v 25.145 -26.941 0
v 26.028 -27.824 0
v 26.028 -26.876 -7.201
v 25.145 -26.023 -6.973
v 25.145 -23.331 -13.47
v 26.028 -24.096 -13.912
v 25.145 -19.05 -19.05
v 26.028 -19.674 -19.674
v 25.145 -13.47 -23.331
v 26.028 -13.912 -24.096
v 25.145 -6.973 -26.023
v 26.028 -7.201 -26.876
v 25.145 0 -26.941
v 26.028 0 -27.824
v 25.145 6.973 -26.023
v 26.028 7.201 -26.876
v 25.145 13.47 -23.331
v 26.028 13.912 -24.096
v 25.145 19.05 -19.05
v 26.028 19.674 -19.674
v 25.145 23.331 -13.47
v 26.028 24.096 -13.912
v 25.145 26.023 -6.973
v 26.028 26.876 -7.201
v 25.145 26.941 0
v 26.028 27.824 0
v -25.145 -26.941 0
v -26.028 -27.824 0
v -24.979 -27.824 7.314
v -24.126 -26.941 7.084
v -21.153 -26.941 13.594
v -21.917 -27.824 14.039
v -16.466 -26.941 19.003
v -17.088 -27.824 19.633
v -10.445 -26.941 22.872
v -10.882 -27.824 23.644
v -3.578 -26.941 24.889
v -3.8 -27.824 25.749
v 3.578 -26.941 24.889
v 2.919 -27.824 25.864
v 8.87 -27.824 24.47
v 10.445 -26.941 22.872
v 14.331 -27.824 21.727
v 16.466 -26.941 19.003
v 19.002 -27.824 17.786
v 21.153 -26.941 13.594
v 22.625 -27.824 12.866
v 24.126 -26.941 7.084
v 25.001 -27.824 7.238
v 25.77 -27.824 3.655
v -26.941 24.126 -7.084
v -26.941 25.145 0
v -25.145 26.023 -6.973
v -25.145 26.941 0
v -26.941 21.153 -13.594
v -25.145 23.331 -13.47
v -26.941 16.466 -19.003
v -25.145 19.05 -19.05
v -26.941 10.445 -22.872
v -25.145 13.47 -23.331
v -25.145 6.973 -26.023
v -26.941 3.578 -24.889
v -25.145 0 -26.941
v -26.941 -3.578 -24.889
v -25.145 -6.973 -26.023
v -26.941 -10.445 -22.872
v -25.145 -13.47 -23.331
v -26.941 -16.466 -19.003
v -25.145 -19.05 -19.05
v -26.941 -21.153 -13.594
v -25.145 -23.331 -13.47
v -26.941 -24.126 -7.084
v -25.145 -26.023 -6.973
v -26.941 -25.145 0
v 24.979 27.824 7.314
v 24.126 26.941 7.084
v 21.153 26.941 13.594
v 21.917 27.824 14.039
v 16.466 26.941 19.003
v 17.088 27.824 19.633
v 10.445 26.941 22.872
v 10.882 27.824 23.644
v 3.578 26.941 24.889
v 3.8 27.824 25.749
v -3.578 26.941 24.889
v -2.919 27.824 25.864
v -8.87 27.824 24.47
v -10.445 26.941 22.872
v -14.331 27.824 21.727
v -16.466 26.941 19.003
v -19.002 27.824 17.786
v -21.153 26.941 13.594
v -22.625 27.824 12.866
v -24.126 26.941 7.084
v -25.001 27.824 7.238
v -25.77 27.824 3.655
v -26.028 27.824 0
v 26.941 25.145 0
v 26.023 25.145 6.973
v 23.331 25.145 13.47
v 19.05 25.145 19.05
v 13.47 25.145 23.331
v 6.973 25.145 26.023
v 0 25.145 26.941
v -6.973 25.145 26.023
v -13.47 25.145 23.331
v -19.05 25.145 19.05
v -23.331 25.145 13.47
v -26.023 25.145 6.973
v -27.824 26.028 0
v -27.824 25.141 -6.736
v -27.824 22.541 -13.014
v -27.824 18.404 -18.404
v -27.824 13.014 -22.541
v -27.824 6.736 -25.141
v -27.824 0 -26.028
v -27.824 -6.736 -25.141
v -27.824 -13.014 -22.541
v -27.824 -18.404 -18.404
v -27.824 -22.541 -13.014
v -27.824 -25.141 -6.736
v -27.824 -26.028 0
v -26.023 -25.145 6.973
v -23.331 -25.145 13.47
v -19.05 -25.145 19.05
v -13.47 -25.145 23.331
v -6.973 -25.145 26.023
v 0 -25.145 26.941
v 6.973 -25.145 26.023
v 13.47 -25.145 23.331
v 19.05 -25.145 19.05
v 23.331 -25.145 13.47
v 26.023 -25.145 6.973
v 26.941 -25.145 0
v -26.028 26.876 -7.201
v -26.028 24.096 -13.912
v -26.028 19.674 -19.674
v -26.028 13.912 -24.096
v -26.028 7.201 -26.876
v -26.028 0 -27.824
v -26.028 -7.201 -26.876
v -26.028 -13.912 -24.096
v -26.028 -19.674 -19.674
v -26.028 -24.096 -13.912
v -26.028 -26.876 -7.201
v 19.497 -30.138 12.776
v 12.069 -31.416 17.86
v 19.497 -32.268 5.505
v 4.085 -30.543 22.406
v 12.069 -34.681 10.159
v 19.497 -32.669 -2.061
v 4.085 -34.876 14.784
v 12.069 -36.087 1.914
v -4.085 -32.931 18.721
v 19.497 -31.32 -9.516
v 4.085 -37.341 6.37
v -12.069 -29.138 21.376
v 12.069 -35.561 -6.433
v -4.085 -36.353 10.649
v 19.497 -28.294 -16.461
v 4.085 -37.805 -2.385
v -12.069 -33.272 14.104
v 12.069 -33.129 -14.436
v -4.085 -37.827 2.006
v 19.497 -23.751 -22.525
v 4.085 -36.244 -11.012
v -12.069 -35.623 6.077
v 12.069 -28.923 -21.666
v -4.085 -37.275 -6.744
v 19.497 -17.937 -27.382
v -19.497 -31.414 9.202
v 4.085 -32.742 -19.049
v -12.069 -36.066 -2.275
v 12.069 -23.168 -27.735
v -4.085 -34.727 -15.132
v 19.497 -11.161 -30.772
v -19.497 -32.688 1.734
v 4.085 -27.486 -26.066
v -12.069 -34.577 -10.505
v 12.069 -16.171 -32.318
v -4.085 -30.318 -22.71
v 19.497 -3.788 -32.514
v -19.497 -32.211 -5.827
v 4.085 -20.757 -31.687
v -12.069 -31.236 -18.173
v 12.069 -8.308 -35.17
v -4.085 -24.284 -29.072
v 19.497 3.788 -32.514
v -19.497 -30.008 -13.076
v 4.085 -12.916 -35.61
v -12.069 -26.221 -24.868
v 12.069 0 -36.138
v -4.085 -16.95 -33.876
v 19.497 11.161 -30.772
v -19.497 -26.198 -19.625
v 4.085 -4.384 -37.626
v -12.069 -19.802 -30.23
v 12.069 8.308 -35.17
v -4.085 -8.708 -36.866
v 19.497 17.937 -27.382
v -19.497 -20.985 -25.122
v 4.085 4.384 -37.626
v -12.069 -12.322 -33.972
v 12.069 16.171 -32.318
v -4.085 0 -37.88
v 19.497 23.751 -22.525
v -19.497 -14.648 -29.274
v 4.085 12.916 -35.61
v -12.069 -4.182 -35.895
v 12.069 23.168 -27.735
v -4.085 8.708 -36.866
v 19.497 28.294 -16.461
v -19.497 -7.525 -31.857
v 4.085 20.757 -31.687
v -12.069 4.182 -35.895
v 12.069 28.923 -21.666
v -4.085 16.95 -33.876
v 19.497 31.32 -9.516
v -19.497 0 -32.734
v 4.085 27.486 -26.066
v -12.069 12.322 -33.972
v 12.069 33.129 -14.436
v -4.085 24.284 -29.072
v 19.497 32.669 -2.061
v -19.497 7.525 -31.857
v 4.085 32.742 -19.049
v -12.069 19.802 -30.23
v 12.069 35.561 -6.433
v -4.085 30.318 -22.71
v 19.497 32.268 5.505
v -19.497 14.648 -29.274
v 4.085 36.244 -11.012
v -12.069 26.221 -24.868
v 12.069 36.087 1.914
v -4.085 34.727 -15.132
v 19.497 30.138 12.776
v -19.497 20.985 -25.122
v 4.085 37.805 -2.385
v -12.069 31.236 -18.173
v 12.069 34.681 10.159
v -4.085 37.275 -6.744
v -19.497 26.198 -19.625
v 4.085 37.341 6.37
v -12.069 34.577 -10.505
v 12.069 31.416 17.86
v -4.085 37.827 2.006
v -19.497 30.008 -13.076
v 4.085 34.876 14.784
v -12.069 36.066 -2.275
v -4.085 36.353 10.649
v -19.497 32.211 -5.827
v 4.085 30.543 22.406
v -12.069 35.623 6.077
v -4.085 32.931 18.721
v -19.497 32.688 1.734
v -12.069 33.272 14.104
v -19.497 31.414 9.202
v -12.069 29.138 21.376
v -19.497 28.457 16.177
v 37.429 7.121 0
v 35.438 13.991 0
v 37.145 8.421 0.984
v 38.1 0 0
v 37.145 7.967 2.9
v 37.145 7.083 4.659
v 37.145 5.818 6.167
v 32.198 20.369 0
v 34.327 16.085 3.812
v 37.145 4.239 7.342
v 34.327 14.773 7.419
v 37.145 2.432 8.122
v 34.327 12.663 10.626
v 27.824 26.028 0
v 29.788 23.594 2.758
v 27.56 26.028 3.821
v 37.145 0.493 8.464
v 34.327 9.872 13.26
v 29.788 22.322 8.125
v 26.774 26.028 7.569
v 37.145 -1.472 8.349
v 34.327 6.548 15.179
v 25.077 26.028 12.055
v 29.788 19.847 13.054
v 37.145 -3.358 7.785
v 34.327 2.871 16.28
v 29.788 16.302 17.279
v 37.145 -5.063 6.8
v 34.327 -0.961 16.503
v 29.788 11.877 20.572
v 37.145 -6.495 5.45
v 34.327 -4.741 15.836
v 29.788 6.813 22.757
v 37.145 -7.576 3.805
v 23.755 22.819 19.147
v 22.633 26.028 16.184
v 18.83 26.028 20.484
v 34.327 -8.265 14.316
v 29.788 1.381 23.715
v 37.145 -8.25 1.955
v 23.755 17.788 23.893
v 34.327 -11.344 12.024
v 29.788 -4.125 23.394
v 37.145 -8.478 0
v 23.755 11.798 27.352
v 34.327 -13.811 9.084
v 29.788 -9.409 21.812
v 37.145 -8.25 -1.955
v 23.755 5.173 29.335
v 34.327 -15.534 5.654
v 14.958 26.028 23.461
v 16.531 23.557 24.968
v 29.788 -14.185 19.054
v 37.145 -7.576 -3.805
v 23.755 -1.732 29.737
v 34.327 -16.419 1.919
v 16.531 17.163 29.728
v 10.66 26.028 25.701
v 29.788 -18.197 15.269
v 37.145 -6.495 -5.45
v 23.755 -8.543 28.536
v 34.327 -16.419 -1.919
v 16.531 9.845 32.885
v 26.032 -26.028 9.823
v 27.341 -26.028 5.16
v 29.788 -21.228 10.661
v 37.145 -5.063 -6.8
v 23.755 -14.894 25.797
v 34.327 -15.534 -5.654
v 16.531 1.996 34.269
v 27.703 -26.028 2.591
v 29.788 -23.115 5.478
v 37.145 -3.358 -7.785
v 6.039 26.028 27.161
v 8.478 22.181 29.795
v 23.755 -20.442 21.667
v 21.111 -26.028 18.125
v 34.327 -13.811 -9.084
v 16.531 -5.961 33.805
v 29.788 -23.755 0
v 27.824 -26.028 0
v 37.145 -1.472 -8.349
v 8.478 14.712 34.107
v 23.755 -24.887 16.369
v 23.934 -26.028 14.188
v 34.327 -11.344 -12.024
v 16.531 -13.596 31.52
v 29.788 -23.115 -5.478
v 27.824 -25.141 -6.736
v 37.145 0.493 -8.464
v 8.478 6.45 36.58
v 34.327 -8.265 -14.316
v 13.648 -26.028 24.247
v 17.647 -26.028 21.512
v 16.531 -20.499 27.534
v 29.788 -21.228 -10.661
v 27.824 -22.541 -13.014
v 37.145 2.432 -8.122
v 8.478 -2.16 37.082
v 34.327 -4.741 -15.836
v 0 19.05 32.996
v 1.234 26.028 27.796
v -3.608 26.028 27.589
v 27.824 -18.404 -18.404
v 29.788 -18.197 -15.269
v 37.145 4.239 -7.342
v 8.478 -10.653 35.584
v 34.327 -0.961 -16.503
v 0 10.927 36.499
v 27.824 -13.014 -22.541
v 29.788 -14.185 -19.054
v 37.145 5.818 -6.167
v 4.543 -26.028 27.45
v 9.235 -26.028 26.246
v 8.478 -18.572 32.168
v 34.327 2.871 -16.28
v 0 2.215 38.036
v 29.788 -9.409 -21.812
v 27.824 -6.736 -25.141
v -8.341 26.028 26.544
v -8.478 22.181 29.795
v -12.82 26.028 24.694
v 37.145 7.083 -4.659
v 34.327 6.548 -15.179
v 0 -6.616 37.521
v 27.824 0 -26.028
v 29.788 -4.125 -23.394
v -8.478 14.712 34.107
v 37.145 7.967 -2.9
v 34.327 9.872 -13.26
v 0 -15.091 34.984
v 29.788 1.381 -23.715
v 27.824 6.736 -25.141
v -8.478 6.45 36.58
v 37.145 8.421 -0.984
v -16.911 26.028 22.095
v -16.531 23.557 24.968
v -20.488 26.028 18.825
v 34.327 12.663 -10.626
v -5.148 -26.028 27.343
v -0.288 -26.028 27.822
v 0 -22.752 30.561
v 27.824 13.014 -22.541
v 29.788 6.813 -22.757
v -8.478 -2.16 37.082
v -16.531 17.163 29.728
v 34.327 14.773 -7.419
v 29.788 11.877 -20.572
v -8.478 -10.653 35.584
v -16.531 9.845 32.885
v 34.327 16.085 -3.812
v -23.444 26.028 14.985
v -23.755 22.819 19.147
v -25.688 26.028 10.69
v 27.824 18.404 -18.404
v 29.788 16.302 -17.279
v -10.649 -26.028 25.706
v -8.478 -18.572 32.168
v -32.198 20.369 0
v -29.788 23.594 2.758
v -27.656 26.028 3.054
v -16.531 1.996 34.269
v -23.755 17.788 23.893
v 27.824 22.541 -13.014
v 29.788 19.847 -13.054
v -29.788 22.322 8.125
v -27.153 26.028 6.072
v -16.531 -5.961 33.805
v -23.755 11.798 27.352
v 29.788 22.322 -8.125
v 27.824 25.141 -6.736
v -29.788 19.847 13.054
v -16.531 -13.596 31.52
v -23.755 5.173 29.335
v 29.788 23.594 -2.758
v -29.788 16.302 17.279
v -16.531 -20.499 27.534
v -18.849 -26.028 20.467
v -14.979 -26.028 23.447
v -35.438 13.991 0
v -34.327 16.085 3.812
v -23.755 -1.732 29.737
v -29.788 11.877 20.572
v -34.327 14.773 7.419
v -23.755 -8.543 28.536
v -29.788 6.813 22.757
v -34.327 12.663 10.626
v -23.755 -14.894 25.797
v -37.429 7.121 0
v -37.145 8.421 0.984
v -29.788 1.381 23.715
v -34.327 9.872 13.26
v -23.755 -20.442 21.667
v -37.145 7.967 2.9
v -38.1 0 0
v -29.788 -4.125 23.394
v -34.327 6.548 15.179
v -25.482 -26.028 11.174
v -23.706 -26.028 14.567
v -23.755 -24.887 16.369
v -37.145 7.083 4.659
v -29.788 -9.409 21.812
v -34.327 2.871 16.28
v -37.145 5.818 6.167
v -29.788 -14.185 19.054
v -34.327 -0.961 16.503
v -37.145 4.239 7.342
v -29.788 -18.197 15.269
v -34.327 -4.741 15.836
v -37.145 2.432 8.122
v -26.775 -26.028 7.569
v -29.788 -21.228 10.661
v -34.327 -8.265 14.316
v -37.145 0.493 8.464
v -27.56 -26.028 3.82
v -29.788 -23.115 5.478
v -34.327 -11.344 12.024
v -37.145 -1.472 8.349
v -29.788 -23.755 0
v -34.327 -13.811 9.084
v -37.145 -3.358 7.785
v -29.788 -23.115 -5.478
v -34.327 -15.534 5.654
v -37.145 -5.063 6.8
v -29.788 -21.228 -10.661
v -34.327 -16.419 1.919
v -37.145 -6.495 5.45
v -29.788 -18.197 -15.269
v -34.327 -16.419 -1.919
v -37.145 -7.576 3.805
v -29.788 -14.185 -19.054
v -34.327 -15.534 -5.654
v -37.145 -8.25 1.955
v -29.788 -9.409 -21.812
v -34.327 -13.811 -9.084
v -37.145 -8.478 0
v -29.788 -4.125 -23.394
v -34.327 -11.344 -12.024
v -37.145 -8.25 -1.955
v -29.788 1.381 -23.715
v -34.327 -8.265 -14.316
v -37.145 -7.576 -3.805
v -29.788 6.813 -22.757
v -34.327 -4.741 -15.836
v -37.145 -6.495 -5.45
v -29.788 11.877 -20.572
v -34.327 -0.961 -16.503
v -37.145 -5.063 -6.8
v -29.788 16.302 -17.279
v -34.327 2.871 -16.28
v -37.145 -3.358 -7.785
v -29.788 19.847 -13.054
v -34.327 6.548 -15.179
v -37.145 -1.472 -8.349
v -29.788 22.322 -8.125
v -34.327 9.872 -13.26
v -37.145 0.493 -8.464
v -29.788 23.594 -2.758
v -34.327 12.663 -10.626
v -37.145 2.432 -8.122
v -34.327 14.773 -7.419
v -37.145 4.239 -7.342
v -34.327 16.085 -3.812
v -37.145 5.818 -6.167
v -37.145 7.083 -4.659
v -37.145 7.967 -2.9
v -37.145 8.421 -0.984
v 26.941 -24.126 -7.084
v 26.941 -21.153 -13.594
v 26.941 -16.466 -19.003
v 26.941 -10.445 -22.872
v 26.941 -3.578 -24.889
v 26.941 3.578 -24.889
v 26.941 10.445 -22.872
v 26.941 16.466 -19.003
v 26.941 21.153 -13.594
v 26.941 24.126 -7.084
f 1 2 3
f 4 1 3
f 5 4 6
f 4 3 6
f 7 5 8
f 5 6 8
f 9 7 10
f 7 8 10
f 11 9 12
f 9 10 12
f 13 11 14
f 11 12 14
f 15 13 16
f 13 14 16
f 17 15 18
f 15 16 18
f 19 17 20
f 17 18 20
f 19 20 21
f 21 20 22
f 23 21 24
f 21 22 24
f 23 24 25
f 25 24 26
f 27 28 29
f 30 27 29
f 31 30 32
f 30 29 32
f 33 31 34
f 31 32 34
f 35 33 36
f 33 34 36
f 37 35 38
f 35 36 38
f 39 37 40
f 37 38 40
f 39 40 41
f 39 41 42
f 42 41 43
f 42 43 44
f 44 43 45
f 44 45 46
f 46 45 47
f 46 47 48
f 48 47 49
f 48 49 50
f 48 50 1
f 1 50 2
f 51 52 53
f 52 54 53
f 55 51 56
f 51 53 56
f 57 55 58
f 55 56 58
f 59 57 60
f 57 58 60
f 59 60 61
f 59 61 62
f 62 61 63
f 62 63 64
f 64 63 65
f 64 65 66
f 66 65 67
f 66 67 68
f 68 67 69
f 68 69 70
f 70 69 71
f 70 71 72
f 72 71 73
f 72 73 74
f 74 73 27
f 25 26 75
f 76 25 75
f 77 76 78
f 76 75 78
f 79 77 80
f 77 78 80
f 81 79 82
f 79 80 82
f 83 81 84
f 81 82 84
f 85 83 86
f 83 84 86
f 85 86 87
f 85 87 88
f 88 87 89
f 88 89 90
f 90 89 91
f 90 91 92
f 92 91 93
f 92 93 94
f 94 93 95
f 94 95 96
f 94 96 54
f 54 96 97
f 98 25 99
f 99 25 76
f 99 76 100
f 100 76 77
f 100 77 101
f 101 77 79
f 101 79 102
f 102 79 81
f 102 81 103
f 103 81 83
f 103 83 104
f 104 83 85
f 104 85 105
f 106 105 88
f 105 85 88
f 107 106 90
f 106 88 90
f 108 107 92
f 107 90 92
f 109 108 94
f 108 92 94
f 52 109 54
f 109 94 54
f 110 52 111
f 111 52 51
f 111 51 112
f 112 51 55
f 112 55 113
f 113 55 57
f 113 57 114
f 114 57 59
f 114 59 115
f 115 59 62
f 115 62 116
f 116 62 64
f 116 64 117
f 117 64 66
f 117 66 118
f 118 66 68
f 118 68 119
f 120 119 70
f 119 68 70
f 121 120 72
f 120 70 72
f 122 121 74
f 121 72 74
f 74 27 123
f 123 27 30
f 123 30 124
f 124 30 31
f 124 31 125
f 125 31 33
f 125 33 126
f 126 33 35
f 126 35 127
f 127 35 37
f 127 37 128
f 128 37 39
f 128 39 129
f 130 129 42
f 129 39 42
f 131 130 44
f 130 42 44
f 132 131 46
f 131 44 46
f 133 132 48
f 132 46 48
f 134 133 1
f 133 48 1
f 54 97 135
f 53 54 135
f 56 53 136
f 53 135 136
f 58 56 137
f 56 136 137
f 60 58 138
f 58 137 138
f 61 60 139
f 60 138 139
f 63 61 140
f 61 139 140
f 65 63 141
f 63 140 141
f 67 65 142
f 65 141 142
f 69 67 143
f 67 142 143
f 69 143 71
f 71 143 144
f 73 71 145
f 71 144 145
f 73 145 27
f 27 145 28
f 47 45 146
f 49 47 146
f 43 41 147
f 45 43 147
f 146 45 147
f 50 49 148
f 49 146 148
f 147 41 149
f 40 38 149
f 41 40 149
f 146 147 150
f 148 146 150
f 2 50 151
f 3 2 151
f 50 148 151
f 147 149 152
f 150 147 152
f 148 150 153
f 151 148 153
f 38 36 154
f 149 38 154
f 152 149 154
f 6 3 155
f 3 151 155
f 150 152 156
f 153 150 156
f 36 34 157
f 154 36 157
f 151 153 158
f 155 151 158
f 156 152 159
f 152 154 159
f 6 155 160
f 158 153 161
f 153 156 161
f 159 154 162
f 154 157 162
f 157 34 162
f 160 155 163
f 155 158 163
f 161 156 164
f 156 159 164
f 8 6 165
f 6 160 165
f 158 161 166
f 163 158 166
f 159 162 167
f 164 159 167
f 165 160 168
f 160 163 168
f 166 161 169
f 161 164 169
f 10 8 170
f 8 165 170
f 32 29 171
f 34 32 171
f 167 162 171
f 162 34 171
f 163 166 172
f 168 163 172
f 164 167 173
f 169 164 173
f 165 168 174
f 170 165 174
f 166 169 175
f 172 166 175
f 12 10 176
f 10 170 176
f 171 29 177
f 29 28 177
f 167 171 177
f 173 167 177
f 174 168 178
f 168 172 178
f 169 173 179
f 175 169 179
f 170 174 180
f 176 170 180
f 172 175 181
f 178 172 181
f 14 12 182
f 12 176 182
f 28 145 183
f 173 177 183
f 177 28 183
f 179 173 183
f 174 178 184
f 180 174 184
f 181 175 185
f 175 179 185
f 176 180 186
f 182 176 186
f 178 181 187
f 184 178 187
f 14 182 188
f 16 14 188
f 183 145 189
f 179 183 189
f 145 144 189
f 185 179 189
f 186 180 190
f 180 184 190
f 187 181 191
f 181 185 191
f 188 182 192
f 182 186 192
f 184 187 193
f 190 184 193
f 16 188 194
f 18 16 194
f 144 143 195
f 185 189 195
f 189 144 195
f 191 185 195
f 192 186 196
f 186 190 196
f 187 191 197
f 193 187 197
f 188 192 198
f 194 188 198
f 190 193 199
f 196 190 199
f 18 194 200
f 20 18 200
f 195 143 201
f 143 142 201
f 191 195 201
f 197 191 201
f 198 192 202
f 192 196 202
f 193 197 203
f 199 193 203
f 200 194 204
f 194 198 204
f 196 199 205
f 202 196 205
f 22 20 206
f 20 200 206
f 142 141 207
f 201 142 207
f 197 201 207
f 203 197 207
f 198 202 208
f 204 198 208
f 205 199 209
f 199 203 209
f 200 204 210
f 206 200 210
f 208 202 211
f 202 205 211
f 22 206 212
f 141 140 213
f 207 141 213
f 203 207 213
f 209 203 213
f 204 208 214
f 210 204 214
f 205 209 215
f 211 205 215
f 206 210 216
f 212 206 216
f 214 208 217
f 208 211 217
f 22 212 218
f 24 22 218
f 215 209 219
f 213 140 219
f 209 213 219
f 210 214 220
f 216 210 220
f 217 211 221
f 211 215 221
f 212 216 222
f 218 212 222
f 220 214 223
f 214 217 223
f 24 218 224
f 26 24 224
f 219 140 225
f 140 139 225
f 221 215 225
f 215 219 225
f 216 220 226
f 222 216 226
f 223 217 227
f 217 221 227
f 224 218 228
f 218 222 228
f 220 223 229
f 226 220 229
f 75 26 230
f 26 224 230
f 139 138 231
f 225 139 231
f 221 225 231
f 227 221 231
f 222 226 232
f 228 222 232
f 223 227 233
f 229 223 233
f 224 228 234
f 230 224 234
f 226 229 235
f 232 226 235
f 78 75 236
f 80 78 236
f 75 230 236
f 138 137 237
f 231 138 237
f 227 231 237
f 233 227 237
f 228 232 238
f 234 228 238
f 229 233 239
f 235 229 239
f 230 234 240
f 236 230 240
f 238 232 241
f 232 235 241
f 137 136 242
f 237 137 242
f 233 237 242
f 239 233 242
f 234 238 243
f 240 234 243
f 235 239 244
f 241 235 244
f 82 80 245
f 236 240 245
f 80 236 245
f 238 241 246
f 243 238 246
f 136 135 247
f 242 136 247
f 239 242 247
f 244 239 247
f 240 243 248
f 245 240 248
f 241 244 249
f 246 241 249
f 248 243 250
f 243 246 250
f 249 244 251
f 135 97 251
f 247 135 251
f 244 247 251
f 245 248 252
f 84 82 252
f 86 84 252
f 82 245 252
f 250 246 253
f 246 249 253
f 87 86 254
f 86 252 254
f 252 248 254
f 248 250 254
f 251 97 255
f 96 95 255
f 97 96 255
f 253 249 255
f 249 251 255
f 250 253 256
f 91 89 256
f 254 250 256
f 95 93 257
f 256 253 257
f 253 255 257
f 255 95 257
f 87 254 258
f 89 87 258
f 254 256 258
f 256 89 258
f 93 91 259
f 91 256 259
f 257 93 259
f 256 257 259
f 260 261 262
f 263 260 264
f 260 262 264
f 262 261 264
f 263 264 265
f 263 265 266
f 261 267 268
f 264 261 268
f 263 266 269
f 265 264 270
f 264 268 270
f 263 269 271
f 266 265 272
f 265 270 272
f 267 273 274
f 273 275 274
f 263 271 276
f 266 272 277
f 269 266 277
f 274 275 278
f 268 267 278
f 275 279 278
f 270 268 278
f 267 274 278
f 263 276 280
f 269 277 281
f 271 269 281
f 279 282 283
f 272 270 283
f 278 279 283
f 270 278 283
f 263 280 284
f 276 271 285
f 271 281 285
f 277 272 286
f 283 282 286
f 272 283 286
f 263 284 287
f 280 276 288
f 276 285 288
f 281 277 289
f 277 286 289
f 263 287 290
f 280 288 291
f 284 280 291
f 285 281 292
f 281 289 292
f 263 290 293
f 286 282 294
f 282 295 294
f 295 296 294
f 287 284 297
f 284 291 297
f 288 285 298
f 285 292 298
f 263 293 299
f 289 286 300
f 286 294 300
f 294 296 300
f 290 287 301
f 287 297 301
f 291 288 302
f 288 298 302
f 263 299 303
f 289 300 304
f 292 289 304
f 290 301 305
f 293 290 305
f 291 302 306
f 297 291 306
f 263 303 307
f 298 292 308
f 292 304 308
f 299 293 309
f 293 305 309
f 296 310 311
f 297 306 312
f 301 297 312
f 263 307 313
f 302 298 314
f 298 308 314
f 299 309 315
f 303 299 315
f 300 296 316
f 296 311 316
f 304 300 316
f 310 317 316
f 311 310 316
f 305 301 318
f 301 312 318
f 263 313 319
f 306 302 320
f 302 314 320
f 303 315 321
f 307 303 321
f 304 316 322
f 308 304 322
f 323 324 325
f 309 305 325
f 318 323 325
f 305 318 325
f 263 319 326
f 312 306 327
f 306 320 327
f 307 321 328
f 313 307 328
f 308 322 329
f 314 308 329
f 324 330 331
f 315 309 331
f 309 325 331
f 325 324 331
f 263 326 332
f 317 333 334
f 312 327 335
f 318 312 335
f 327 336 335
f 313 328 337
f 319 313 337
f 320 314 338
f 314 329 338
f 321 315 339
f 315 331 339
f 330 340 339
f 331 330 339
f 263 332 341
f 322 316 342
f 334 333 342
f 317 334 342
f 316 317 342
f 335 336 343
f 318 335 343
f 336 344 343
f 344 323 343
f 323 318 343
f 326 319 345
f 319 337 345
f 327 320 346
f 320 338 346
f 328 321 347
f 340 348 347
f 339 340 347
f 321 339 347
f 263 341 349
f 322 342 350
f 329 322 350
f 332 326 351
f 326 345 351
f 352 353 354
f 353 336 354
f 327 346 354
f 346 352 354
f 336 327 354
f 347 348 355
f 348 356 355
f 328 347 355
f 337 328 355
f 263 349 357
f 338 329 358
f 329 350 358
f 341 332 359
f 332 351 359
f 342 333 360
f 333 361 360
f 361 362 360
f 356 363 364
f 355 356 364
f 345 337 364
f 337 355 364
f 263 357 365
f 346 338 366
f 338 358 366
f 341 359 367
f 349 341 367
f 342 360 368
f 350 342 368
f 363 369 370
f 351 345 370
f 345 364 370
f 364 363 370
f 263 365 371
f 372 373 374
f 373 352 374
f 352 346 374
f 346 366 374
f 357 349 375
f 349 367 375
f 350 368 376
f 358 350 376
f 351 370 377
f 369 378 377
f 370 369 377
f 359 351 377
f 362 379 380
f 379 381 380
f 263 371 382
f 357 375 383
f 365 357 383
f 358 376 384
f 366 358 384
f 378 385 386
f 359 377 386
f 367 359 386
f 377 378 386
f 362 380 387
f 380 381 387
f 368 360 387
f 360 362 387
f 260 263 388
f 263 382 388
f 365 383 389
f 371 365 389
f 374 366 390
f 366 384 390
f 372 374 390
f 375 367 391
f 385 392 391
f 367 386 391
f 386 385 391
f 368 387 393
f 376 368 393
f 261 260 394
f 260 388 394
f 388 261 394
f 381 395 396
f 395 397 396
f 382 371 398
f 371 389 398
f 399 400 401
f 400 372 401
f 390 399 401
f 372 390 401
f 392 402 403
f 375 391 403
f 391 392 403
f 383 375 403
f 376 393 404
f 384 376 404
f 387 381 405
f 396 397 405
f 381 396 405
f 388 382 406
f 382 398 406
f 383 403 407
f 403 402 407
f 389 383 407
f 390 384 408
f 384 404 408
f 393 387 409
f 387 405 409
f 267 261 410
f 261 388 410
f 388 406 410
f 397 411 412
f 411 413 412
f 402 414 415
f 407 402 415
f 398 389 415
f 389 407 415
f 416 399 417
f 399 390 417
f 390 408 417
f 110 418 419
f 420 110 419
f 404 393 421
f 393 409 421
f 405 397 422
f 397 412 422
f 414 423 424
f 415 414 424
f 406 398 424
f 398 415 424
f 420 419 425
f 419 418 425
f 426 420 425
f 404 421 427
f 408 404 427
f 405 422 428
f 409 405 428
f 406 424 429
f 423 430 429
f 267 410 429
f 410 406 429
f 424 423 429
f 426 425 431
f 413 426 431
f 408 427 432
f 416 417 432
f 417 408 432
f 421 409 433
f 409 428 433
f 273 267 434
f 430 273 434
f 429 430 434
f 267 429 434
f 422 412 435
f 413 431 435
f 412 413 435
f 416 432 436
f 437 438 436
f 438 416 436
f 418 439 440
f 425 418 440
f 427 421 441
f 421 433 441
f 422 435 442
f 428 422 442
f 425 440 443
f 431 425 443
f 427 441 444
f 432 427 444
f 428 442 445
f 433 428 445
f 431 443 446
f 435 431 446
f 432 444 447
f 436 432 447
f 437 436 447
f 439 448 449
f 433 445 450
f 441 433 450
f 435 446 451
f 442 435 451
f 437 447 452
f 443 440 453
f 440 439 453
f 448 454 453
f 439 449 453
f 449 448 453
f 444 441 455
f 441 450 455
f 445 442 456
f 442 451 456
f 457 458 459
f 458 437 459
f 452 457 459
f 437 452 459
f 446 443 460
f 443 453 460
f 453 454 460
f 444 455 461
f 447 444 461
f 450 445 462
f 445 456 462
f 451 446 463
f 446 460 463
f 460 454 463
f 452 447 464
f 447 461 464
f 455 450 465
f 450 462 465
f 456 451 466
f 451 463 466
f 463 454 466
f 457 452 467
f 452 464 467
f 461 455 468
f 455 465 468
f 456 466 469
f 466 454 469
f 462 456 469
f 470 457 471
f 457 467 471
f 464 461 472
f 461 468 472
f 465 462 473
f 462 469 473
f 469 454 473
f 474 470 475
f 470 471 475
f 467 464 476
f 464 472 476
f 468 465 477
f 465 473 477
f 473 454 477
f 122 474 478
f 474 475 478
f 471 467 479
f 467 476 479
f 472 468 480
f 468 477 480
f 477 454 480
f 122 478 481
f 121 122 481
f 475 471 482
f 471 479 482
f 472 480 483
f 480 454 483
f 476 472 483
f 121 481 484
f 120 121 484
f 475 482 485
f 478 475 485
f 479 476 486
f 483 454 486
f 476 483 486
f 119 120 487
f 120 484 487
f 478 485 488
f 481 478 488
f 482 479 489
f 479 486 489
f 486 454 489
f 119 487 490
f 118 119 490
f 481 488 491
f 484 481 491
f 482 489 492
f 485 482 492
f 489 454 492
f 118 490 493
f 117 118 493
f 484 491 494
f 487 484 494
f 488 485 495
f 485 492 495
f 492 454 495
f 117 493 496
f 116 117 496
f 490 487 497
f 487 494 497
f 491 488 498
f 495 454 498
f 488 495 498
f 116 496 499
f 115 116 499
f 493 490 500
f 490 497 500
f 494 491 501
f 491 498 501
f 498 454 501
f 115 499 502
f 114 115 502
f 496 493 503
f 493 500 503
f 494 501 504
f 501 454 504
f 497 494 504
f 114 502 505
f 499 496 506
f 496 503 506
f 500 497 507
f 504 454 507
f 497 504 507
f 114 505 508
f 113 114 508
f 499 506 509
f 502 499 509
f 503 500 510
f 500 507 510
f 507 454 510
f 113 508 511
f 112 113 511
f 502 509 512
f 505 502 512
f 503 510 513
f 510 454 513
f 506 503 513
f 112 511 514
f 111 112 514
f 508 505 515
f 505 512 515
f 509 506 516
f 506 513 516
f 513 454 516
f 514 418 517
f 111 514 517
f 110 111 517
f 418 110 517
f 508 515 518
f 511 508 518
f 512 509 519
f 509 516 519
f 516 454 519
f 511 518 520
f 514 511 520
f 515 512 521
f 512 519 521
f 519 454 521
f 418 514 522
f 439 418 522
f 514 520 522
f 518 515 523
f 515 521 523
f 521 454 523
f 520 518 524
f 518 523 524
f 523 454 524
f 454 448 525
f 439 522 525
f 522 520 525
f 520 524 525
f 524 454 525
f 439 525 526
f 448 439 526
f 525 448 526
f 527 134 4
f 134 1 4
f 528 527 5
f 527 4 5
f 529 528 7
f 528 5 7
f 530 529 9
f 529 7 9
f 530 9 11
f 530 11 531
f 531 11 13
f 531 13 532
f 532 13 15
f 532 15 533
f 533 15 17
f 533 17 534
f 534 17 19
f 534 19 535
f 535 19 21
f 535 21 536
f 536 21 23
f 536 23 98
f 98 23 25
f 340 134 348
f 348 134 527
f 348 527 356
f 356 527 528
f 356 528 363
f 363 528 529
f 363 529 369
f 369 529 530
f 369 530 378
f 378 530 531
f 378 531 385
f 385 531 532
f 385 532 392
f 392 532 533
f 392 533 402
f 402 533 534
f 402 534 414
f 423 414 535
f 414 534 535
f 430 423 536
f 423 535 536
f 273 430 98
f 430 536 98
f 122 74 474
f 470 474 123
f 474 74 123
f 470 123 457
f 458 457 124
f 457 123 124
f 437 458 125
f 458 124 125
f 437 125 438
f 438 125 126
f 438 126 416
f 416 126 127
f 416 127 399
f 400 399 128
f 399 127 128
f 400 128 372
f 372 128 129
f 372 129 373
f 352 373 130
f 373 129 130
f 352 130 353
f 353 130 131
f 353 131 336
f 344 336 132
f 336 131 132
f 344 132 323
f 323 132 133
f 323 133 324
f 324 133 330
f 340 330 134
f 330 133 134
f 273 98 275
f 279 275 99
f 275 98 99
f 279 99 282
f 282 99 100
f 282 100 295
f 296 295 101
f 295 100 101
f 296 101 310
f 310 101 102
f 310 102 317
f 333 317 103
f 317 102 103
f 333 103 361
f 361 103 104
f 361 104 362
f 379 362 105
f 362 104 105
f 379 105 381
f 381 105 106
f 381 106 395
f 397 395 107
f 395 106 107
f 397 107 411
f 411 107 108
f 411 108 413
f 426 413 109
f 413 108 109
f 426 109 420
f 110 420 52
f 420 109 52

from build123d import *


with BuildPart() as part:
    # Sketch8 → Revolve2 (revolve)
    with BuildSketch(Plane.XY):
        with BuildLine():
            Line((-38.1, 0), (38.1, 0))
            ThreePointArc((38.1, 0), (0, 38.1), (-38.1, 0))
        make_face()
    revolve(axis=Axis((-38.1, 0, 0), (1, 0, 0)))

    # Cut-Sweep2: sweep along a curve in space
    with BuildLine() as cut_sweep2_path:
        ThreePointArc((26.940768363, -26.940768363, 0), (26.940768363, 0, -26.940768363), (26.940768363, 26.940768363, 0))
        ThreePointArc((26.940768363, 26.940768363, 0), (0, 26.940768363, 26.940768363), (-26.940768363, 26.940768363, 0))
        ThreePointArc((-26.940768363, 26.940768363, 0), (-26.940768363, 0, -26.940768363), (-26.940768363, -26.940768363, 0))
        ThreePointArc((-26.940768363, -26.940768363, 0), (0, -26.940768363, 26.940768363), (26.940768363, -26.940768363, 0))
    # Sketch13 → Cut-Sweep2 (sweep, cut)
    with BuildSketch(Plane.XY):
        Polygon((-26.940768363, 28.736819587), (-28.736819587, 26.940768363), (-26.940768363, 25.144717139), (-25.144717139, 26.940768363), align=None)
    sweep(path=cut_sweep2_path.line, mode=Mode.SUBTRACT)


solid = part.part
